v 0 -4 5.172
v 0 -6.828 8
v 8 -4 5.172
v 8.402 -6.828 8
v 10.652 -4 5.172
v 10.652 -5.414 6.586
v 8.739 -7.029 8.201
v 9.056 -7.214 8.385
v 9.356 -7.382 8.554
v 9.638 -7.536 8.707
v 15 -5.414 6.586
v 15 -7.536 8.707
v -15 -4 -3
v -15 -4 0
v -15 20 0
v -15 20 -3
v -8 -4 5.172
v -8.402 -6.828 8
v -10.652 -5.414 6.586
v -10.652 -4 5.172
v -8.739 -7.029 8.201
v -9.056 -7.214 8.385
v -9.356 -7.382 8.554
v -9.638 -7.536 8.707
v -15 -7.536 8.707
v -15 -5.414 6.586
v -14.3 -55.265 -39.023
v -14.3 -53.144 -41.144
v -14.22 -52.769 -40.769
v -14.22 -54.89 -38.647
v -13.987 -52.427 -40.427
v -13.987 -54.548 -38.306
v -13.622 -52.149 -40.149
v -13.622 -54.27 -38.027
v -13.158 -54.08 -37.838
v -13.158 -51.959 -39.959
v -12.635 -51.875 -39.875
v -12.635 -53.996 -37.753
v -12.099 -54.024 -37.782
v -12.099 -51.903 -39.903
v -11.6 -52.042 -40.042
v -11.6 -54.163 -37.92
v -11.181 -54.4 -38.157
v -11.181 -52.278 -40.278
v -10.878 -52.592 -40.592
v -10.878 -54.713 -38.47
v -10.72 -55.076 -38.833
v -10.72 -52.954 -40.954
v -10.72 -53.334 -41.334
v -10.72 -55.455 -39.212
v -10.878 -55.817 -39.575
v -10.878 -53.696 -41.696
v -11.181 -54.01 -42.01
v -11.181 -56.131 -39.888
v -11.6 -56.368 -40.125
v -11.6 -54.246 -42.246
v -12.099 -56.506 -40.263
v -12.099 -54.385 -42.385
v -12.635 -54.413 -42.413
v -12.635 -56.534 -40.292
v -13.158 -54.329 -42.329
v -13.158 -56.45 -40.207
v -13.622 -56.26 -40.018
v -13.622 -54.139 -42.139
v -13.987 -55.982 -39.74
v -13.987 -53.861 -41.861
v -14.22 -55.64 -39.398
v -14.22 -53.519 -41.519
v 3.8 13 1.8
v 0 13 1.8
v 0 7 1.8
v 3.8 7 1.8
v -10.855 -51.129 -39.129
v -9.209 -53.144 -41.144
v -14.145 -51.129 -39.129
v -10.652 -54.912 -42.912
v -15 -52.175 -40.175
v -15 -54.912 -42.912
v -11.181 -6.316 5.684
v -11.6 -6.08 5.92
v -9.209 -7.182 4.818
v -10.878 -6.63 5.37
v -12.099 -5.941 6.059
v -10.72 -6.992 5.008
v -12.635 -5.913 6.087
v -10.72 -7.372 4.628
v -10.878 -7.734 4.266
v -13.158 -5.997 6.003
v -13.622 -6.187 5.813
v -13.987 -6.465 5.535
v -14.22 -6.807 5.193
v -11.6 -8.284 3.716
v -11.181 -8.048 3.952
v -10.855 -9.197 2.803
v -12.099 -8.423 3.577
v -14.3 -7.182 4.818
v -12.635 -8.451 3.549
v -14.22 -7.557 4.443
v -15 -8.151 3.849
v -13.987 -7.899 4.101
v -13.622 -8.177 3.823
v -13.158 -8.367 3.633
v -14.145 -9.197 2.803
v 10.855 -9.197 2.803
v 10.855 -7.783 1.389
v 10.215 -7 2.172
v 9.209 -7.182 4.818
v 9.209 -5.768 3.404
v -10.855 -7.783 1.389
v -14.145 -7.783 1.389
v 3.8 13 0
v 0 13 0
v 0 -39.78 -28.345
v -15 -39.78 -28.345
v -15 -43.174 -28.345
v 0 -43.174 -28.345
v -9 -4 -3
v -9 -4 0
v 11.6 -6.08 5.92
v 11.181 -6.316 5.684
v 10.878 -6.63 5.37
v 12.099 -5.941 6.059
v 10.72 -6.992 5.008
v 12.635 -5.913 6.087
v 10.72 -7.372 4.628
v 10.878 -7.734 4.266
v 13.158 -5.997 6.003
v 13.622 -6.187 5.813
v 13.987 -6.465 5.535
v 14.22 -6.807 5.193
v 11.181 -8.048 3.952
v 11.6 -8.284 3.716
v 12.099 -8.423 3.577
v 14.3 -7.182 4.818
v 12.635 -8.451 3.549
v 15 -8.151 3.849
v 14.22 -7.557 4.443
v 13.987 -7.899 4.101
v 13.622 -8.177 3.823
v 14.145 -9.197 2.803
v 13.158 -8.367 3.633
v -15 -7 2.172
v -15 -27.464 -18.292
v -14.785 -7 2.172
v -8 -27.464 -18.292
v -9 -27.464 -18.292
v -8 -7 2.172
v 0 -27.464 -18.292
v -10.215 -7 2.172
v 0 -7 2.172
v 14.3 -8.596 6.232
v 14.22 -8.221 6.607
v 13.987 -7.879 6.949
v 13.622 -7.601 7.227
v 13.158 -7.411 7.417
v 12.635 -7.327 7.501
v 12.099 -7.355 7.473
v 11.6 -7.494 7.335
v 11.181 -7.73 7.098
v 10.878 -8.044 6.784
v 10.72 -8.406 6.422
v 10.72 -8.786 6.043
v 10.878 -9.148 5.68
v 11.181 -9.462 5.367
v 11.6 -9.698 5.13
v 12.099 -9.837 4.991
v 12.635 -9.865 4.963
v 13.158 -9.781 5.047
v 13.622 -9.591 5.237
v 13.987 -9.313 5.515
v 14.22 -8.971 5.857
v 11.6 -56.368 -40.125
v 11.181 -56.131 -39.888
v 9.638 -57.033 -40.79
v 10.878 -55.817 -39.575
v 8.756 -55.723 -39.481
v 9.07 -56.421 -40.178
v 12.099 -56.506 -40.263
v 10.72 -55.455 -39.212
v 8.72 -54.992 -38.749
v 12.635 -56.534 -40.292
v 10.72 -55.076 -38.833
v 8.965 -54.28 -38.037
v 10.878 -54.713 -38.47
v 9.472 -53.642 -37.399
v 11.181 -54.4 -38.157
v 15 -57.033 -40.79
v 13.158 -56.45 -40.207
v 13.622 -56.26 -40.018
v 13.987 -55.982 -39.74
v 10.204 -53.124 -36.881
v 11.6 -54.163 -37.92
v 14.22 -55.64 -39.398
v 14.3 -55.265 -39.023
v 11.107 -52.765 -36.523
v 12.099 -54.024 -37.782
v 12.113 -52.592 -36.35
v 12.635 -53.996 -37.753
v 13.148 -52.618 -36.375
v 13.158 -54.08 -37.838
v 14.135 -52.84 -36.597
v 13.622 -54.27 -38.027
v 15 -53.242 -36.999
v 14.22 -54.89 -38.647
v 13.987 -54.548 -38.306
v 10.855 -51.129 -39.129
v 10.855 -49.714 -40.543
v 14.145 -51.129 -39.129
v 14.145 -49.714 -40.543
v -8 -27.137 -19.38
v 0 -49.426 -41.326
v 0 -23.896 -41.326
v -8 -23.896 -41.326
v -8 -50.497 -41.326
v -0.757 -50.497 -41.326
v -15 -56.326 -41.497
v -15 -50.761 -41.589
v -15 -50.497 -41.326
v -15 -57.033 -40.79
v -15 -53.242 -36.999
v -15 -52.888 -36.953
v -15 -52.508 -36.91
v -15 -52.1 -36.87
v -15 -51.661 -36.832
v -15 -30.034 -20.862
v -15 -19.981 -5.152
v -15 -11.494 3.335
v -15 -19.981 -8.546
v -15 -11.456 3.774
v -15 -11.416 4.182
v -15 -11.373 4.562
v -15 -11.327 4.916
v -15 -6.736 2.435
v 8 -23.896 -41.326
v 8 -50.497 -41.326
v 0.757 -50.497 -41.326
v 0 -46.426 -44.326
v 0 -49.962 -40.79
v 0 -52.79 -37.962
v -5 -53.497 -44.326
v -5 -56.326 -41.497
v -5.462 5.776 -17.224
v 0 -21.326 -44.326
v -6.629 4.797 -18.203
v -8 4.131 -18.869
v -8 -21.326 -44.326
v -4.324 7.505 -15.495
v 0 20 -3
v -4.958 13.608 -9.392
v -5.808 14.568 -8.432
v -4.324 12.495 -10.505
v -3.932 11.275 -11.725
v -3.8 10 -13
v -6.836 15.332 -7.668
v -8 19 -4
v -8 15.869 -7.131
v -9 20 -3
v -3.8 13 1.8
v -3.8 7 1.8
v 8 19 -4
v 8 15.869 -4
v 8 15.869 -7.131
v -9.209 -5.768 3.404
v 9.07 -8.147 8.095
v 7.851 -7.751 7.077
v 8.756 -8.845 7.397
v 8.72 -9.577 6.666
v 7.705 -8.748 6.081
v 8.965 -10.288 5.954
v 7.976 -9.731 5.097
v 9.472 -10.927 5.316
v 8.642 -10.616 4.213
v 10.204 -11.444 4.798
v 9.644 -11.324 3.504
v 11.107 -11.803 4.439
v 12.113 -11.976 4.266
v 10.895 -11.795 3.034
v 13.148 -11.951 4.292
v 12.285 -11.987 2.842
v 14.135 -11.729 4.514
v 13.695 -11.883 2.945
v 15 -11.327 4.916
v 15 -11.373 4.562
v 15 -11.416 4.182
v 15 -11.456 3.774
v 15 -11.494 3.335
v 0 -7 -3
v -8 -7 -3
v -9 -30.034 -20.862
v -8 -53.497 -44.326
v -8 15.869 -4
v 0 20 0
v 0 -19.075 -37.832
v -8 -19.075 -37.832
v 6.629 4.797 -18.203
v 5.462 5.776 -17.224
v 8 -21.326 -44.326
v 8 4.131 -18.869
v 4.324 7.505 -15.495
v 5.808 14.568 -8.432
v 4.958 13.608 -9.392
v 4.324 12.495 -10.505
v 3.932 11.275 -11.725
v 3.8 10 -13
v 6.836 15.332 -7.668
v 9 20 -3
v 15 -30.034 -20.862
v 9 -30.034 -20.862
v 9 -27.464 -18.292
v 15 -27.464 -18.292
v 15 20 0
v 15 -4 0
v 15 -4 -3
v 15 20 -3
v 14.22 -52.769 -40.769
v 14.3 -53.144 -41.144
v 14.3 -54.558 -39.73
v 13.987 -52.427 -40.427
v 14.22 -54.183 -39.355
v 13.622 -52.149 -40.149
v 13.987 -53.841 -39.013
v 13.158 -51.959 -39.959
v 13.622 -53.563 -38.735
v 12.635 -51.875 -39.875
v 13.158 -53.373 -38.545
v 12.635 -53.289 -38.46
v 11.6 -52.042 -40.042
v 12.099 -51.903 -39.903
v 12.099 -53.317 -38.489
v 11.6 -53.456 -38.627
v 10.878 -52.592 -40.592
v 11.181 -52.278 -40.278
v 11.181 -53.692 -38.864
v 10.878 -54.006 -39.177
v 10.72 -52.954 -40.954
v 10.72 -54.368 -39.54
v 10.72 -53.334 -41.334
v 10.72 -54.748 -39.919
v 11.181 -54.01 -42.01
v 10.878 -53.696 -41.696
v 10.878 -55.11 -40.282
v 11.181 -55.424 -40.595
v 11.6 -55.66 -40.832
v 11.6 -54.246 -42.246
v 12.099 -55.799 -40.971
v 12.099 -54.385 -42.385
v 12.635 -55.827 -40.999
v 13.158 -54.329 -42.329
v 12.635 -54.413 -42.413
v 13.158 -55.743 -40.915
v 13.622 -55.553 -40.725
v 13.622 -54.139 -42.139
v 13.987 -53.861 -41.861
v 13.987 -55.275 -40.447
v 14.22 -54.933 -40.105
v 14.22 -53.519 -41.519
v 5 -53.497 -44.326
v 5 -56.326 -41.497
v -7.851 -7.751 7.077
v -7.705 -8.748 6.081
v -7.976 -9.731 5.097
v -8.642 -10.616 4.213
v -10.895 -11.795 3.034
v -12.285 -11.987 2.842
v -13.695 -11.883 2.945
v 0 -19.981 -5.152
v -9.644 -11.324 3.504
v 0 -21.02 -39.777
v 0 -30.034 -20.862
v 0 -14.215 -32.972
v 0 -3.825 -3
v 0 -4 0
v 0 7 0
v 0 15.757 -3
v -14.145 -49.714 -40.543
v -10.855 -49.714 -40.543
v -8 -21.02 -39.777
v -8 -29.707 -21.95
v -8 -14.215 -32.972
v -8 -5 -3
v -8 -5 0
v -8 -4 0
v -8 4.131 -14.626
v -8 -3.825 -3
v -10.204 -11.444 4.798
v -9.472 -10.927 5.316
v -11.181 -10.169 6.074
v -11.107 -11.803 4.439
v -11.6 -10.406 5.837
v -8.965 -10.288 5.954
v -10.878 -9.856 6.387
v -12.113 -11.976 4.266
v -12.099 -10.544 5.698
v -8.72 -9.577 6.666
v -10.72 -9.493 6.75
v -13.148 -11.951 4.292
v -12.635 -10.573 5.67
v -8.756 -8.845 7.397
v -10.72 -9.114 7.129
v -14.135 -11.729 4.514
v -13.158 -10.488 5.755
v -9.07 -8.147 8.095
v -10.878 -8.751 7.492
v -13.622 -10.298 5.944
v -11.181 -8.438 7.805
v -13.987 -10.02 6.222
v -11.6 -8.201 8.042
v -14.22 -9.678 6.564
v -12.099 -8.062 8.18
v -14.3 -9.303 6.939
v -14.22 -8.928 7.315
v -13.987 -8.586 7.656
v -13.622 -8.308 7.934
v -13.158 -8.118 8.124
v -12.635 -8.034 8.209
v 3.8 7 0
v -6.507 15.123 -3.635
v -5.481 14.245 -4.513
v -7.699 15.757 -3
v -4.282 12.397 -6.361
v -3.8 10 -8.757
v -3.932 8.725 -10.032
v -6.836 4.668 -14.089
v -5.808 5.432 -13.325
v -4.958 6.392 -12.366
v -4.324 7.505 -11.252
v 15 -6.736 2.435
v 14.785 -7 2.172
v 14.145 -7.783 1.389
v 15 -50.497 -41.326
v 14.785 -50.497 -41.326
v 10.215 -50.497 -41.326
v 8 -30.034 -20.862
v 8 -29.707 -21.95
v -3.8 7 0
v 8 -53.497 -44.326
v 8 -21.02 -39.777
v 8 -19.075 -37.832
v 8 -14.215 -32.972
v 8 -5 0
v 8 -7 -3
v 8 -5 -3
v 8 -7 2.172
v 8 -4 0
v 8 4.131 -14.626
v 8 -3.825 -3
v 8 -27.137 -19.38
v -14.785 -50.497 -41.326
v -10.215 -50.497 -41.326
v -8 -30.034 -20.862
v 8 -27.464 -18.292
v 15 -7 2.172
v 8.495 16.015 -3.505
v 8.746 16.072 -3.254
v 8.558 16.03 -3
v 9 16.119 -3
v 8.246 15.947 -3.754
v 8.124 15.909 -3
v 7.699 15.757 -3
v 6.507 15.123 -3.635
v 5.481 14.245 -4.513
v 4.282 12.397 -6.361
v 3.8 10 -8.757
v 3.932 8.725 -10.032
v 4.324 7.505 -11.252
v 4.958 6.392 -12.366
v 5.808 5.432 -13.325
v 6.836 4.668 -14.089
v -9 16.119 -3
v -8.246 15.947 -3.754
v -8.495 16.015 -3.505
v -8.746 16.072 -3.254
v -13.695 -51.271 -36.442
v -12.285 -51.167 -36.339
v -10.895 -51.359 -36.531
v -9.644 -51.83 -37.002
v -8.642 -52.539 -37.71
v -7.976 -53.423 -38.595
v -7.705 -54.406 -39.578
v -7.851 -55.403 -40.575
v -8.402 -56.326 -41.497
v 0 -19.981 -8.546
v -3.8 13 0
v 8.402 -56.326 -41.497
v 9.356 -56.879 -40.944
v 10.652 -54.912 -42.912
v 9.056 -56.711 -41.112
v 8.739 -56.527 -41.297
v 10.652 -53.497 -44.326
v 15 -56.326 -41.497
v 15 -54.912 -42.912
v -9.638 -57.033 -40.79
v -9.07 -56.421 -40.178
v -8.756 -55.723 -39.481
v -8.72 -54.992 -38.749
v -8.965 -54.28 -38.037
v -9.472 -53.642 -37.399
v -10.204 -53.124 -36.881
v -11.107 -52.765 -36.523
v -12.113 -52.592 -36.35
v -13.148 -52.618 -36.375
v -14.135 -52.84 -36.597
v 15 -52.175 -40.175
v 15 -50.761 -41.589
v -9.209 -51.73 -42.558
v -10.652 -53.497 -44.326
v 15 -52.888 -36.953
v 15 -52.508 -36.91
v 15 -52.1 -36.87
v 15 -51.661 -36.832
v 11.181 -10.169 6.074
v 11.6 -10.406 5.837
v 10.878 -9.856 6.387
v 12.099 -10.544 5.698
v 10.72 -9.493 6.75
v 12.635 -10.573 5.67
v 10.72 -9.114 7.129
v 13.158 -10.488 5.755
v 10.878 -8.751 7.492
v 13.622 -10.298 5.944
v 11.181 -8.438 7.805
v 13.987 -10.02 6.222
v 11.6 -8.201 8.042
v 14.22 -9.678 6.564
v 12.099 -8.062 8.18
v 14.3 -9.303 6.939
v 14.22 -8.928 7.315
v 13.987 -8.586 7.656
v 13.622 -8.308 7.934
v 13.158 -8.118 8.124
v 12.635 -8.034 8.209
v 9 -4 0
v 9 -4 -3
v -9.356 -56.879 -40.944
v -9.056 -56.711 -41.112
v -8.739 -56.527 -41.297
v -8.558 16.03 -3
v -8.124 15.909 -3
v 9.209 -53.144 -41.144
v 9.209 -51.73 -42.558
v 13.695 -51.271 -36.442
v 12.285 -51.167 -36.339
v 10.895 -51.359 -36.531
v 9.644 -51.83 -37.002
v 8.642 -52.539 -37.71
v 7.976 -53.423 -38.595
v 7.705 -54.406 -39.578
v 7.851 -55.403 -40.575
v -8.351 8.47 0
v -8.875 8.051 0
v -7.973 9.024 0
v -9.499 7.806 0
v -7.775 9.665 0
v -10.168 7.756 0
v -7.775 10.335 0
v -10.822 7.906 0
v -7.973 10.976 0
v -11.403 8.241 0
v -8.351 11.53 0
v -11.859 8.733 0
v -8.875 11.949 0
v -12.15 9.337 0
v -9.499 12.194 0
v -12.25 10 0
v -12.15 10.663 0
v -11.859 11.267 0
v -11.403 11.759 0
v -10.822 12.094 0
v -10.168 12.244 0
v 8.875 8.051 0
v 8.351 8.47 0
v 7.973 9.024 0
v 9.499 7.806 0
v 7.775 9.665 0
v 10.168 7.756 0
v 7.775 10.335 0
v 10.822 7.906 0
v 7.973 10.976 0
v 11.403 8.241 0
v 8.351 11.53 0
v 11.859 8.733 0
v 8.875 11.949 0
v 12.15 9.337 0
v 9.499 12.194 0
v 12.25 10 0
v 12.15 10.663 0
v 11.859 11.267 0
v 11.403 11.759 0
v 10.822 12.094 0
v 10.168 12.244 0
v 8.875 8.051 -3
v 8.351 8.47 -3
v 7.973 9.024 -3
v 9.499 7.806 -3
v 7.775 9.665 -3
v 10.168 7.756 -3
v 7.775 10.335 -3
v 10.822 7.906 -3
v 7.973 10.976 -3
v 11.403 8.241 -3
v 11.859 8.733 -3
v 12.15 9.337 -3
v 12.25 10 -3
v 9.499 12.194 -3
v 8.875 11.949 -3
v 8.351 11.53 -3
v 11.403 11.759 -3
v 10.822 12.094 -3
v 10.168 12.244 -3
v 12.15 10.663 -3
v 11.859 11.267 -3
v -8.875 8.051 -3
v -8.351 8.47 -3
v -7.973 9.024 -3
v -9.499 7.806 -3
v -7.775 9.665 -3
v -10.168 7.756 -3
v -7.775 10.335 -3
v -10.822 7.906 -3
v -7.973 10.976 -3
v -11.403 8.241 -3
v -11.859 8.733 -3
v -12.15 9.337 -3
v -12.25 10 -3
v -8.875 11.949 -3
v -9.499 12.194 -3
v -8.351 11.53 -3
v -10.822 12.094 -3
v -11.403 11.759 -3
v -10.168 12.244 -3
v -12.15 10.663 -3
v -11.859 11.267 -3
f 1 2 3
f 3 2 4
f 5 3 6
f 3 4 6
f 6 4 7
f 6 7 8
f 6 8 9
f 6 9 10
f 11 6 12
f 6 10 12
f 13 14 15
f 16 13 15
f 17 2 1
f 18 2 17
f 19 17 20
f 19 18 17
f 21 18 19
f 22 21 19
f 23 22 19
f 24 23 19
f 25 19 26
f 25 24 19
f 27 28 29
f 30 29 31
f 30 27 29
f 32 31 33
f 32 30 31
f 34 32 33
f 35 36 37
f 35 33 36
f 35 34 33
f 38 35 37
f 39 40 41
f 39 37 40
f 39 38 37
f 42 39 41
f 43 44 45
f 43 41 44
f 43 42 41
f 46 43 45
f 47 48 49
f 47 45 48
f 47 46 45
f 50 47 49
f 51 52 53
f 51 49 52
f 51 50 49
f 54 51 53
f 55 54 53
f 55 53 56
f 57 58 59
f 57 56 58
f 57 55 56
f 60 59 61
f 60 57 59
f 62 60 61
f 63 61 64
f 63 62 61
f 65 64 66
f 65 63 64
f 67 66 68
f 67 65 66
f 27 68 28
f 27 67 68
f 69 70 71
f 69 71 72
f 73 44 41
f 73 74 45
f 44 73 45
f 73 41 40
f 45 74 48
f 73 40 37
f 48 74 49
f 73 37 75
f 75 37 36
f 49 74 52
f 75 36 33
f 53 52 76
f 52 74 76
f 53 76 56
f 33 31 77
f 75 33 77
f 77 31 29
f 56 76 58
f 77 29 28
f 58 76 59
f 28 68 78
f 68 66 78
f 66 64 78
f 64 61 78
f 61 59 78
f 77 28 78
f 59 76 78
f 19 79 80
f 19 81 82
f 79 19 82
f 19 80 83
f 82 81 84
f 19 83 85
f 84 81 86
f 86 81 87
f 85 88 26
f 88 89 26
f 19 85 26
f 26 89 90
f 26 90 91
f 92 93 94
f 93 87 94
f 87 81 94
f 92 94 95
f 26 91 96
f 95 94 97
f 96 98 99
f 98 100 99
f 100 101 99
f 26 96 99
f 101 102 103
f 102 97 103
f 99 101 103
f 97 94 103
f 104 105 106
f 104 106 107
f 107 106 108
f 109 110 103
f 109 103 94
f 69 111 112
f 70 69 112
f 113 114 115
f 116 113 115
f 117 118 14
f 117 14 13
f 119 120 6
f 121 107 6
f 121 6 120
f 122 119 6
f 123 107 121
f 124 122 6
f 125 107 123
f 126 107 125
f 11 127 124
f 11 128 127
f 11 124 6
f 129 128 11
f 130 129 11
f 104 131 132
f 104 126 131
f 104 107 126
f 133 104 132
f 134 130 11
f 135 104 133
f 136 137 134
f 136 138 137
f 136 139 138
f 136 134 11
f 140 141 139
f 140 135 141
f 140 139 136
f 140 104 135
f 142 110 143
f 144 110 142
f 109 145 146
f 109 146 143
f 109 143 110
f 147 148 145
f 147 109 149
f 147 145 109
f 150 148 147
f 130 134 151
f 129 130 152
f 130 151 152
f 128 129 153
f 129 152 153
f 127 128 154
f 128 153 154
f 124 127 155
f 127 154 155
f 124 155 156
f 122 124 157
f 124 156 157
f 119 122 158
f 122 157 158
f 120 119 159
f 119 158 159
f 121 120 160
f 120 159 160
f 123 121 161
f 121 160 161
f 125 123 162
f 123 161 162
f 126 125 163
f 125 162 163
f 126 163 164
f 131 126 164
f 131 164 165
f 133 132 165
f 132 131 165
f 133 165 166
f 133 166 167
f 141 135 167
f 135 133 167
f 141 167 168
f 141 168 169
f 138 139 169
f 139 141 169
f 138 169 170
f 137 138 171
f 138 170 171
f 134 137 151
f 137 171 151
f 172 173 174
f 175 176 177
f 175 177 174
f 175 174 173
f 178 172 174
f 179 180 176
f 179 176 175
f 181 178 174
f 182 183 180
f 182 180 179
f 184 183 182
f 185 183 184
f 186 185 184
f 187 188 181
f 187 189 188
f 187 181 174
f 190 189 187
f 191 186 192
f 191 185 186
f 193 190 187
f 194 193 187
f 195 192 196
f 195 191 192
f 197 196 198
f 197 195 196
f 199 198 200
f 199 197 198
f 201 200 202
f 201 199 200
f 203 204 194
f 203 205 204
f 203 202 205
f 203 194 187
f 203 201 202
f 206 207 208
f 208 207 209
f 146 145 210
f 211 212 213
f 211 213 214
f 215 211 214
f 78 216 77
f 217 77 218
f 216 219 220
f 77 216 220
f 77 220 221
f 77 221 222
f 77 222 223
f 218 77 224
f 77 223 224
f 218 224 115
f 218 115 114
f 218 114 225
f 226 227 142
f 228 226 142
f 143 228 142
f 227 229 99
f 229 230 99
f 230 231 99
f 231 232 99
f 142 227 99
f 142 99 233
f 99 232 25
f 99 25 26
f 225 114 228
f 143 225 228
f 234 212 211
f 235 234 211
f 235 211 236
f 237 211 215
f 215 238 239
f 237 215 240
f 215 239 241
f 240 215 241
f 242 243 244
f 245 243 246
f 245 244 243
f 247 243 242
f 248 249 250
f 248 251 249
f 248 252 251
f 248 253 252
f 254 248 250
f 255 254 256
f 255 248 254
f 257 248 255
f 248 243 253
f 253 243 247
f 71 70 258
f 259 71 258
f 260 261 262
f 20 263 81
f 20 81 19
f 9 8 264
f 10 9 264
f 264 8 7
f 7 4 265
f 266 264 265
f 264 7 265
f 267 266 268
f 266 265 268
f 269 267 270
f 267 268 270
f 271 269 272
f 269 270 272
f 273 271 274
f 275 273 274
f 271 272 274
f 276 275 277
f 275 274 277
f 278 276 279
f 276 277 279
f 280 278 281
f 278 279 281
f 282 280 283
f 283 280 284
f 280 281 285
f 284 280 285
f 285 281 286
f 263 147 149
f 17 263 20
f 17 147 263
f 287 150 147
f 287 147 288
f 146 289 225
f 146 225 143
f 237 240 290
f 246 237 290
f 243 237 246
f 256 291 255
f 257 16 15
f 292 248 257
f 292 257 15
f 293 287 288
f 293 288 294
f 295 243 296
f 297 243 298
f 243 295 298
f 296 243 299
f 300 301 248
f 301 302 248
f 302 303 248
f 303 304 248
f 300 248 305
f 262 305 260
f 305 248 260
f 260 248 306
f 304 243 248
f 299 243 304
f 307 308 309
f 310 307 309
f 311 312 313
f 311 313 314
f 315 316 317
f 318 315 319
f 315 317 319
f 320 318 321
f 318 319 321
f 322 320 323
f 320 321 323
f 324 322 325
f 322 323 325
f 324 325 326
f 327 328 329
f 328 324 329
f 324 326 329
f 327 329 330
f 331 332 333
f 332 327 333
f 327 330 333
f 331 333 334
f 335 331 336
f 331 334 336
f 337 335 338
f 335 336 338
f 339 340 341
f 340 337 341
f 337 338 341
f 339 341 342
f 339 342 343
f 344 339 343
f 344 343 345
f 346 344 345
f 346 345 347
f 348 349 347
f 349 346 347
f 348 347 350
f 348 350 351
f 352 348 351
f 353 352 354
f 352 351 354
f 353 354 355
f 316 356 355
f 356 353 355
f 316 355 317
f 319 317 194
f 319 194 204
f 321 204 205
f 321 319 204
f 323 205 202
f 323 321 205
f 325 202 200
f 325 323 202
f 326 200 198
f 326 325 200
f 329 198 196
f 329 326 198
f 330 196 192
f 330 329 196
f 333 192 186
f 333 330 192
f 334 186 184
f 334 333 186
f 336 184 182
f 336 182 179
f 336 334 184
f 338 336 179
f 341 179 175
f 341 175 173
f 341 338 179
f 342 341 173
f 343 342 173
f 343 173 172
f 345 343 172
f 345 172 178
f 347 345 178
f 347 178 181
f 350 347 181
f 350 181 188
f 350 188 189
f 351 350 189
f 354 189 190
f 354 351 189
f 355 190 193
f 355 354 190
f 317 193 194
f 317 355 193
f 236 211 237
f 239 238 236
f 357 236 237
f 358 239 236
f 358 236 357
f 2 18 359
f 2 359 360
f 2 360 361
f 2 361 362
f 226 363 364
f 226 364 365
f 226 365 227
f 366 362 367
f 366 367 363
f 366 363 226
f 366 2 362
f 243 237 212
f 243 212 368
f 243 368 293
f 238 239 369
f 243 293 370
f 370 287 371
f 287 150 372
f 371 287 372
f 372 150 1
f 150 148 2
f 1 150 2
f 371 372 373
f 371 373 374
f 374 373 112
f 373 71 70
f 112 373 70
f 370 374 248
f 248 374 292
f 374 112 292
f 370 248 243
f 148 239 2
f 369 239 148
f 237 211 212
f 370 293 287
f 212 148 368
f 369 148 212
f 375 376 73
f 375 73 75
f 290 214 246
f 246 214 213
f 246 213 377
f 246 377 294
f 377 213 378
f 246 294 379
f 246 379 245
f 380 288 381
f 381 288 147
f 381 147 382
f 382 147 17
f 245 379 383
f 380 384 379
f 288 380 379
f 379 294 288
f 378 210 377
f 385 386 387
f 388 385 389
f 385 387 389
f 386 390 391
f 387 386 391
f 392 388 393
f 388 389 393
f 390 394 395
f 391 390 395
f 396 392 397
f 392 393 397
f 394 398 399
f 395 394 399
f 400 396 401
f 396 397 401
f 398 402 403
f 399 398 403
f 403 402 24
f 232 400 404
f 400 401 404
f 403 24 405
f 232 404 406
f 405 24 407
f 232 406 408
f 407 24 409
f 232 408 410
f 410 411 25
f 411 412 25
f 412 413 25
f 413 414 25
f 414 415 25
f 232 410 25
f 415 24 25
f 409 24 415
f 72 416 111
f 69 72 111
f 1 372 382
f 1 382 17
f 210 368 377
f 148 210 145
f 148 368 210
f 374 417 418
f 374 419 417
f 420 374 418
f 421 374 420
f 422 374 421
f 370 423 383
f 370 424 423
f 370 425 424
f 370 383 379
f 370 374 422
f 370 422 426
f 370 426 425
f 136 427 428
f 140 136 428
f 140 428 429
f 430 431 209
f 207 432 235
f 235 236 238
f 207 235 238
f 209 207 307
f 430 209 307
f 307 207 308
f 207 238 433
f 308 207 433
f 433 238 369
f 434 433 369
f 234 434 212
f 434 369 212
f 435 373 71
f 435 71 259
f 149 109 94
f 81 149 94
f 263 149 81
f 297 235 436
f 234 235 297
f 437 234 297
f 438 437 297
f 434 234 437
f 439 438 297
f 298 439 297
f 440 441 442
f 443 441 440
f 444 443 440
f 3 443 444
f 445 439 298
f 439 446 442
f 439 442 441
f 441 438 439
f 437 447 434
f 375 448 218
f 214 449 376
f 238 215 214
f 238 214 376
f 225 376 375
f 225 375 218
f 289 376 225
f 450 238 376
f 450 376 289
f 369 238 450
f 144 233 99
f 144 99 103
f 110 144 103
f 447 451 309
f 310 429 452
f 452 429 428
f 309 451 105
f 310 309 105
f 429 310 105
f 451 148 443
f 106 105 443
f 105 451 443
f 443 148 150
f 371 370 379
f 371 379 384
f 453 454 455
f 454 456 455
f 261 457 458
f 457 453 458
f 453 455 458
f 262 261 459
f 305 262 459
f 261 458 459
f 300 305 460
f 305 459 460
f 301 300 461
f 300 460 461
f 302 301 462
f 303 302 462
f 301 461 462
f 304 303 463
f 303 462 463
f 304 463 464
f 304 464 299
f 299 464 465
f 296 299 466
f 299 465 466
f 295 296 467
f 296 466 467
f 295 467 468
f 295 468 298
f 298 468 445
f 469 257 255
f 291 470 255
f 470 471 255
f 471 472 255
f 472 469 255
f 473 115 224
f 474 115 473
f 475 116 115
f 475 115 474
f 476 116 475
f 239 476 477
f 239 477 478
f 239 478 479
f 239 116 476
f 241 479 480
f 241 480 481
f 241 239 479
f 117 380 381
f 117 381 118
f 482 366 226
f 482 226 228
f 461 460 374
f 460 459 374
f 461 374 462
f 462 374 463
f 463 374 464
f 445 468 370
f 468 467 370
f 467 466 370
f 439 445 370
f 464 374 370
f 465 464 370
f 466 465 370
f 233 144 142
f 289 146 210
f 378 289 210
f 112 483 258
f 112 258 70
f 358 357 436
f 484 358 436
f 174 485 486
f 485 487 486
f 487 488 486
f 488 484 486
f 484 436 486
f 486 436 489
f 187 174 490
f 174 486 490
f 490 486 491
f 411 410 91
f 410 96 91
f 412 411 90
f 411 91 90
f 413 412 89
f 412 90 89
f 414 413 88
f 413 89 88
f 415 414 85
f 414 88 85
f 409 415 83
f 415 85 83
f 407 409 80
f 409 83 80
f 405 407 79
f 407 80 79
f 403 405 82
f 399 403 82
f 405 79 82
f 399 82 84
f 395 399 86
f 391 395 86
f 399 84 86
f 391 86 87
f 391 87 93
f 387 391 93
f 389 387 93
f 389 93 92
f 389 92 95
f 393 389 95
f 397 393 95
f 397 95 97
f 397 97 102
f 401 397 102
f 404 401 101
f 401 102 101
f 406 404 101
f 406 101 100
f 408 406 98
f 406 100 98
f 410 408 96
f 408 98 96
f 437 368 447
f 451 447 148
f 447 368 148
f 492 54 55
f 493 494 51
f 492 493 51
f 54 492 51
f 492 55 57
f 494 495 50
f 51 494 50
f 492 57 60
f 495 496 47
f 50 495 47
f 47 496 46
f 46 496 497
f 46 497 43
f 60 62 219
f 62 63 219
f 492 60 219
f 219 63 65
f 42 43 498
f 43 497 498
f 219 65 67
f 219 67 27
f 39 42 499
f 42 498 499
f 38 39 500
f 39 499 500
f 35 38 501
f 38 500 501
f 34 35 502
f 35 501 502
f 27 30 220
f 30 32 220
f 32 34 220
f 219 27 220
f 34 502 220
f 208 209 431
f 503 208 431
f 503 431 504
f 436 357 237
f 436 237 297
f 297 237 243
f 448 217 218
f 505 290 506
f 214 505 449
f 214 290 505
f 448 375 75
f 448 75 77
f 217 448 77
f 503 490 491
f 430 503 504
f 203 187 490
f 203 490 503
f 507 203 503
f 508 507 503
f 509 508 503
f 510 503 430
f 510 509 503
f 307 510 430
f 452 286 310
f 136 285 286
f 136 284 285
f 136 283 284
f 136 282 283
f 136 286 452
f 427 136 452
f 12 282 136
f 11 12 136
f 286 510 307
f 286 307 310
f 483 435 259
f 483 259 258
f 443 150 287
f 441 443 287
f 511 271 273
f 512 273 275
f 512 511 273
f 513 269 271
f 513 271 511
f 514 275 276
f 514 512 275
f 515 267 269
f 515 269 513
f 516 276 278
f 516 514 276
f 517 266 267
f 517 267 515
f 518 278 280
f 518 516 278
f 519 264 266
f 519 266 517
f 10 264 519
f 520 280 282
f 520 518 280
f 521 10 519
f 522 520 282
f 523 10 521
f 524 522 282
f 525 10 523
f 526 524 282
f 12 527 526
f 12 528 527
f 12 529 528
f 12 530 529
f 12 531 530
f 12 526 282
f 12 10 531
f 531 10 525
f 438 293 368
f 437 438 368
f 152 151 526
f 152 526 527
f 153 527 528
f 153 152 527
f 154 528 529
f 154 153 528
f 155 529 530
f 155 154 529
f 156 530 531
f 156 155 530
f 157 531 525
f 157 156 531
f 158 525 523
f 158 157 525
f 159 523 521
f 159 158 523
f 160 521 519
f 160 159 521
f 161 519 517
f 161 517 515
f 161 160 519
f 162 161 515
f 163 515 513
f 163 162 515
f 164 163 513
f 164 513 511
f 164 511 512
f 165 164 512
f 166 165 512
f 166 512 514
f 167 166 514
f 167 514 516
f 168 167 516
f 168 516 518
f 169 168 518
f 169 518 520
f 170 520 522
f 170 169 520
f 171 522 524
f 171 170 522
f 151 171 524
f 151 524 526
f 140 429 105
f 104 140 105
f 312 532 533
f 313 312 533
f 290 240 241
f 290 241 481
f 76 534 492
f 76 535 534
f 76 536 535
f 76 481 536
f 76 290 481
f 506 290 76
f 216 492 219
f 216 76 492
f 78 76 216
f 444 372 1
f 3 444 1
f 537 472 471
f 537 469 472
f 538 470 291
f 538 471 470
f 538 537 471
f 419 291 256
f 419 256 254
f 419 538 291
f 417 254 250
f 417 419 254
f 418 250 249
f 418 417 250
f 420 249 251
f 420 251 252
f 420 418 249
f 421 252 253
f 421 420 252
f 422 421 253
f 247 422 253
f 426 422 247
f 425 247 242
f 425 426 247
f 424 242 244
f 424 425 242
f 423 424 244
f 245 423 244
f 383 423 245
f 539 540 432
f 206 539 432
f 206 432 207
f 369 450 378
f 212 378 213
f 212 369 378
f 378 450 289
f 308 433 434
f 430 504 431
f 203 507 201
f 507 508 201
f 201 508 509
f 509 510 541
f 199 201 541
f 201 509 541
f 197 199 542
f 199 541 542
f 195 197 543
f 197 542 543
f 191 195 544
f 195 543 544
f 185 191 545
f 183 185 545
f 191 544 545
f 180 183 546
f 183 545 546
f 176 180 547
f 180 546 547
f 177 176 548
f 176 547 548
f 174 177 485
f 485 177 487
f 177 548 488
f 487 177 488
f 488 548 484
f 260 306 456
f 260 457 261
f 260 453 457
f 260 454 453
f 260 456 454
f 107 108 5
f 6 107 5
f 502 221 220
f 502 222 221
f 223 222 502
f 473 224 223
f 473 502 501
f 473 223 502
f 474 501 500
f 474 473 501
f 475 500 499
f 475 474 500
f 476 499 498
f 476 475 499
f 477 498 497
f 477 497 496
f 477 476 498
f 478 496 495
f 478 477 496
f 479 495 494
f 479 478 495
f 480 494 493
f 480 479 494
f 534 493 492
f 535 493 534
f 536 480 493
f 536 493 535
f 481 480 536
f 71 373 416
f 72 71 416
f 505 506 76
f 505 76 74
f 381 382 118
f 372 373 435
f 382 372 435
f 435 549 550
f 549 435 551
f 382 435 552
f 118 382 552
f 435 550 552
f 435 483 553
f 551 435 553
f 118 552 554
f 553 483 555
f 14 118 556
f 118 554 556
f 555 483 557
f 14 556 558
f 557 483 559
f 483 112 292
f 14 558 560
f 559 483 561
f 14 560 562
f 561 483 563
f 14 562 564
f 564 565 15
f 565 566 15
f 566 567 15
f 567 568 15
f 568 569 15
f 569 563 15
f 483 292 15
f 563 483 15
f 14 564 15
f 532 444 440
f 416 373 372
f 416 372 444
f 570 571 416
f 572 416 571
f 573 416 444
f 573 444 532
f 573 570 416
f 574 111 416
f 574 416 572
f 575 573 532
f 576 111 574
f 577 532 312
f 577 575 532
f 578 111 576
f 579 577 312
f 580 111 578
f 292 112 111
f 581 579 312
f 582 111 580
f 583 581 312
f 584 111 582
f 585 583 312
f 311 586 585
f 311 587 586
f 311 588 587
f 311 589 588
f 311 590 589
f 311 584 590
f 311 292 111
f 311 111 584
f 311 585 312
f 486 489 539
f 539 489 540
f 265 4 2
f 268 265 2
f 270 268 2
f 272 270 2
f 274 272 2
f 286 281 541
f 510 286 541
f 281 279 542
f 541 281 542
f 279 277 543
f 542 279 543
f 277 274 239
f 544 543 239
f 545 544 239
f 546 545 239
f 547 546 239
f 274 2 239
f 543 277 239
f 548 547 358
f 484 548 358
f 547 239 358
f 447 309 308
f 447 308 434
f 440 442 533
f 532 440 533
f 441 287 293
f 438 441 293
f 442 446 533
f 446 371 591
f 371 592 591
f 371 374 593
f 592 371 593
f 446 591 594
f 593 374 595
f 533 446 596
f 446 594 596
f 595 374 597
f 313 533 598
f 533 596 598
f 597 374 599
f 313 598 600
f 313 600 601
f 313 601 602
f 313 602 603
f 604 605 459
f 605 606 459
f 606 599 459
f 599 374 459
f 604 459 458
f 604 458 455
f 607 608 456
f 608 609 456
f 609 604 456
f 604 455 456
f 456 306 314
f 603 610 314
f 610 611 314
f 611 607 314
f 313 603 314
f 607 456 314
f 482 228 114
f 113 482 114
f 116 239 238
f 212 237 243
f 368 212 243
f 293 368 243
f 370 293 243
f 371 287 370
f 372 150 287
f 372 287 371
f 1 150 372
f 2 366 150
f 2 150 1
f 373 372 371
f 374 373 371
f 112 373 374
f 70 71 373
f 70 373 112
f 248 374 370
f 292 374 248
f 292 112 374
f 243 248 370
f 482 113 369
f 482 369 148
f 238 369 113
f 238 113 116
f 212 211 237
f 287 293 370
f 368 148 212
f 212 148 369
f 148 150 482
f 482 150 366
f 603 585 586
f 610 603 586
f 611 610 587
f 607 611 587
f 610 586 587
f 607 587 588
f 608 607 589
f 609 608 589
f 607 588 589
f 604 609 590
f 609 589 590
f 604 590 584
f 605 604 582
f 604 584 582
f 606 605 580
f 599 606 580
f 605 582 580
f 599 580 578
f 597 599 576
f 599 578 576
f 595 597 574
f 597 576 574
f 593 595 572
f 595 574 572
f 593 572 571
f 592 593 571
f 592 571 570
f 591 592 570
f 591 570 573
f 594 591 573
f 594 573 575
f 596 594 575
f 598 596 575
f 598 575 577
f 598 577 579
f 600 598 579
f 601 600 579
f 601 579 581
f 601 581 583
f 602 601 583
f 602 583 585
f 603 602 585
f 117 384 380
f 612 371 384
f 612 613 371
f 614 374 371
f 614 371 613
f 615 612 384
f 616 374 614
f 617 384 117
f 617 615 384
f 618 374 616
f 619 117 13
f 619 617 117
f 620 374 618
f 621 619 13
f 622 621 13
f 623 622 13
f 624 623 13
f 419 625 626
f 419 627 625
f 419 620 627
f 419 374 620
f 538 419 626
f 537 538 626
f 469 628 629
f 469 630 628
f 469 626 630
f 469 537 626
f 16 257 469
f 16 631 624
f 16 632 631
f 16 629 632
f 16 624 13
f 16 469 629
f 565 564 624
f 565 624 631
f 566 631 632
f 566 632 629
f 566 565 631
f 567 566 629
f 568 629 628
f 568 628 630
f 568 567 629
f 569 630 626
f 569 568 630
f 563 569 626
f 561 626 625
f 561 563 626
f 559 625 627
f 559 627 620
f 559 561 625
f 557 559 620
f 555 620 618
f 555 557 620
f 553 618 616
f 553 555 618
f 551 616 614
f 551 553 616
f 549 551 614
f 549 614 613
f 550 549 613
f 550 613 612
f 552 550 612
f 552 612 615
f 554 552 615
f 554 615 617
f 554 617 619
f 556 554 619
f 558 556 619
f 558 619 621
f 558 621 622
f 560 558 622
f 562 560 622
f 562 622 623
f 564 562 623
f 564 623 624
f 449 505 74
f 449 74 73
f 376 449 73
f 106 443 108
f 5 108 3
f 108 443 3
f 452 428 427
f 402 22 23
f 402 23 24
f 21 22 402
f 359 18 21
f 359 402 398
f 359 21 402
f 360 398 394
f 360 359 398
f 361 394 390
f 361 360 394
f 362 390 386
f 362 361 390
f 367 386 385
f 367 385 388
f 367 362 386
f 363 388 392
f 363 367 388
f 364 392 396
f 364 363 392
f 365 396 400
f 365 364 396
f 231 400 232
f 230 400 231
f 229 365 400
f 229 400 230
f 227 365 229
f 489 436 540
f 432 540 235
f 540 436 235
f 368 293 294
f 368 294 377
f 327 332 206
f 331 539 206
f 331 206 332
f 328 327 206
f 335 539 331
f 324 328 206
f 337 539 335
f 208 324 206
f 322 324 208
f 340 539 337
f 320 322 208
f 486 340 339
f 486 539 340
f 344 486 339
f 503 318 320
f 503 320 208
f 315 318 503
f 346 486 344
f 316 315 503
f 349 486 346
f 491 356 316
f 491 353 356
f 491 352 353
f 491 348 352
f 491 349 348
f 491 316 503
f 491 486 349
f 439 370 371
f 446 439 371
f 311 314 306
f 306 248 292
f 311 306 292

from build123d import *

# Parameters (mm, degrees)
F1_DEPTH      = 15
F2_DEPTH      = 8
F4_DEPTH      = 1.8
F3_R          = 2.25
F5_DEPTH      = 44.3269018078
F6_START      = -3
F6_DEPTH      = 41.3269018078
F7_R          = 1.8
F8_DEPTH      = 4
F9_DEPTH      = 1
F10_T1_DEPTH  = 3
F10_T6_ANGLE  = 249.9440889996
F10_T12_ANGLE = 249.9440889996
F10_T18_DEPTH = 8.7779135172
F10_T24_DEPTH = 9.2748056755
F10_S25_R     = 6.2
F10_T26_DEPTH = 6
F11_R         = 1.8
F12_DEPTH     = 2
F13_T1_DEPTH  = 29.7168298797
F16_DEPTH     = 15


# Not quite as in the source:
# - a fillet or chamfer that OpenCascade refuses, or shapes differently, is made with other operations: its cross-section is extruded or revolved along the edge and cut away or added


with BuildPart() as f1:
    # F0 (on Right) → F1 (new body)
    with BuildSketch(Plane.YZ):
        Polygon((-7, 2.1715728753), (-4, 5.1715728753), (-6.8284271247, 8), (-56.3259018078, -41.4974746831), (-53.4974746831, -44.3259018078), (-50.4974746831, -41.3259018078), (-30.033743948, -20.8621710728), (-27.463730735, -18.2921578598), align=None)
    extrude(amount=F1_DEPTH)



with BuildPart() as f1b:
    # F0 (on Right) → F1, piece 2 (new body)
    with BuildSketch(Plane.YZ):
        Polygon((20, 0), (0, 0), (-4, 0), (-4, -3), (-3.8248562286, -3), (15.7573593129, -3), (20, -3), align=None)
    extrude(amount=F1_DEPTH)


with BuildPart() as f1_1:
    add(f1.part)

    add(f1b.part)  # F2 merges F1b
    # F0 (on Right) → F2 (join)
    with BuildSketch(Plane.YZ):
        Polygon((-21.3259018078, -44.3259018078), (20, -3), (15.7573593129, -3), (-14.2149635258, -32.9723228387), (-3.8248562286, -3), (-4, -3), (-7, -3), (-19.0748035156, -37.8321628285), align=None)
        Polygon((-53.4974746831, -44.3259018078), (-21.3259018078, -44.3259018078), (-19.0748035156, -37.8321628285), (-21.0197849861, -39.777144299), (-27.463730735, -18.2921578598), (-30.033743948, -20.8621710728), (-23.8961012248, -41.3259018078), (-50.4974746831, -41.3259018078), align=None)
        Polygon((-4, -3), (-4, 0), (-4, 5.1715728753), (-7, 2.1715728753), (-7, -3), align=None)
    extrude(amount=F2_DEPTH)

    # F3 (on face) → F4 (join)
    with BuildSketch(Plane.XY):
        Polygon((3.8, 7), (3.8, 10), (3.8, 13), (0, 13), (0, 7), align=None)
    extrude(amount=F4_DEPTH)

    # F3 (on face) → F5 (cut, through all)
    with BuildSketch(Plane.XY):
        with Locations((10, 10)):
            Circle(F3_R)
    extrude(amount=-F5_DEPTH, mode=Mode.SUBTRACT)

    # F3 (on face) → F6 (cut)
    with BuildSketch(Plane.XY.offset(F6_START)):
        with BuildLine():
            Line((15, 6.333939444), (15, 13.666060556))
            ThreePointArc((15, 13.666060556), (8.0712698478, 15.8923679451), (3.8, 10))
            ThreePointArc((3.8, 10), (8.0712698478, 4.1076320549), (15, 6.333939444))
        make_face()
        with Locations((10, 10)):
            Circle(F3_R, mode=Mode.SUBTRACT)
    extrude(amount=-F6_DEPTH, mode=Mode.SUBTRACT)

    # F7 (on face) → F8 (cut, through all)
    with BuildSketch(Plane(origin=(0, -7.4142135624, 7.4142135624), x_dir=(1, 0, 0), z_dir=(0, -0.7071067812, 0.7071067812))):
        with Locations((12.5, -1.6715728753)):
            Circle(F7_R)
        with Locations((12.5, -66.6715728753)):
            Circle(F7_R)
    extrude(amount=-F8_DEPTH, mode=Mode.SUBTRACT)

    # F7 (on face) → F9 (join)
    with BuildSketch(Plane(origin=(0, -7.4142135624, 7.4142135624), x_dir=(1, 0, 0), z_dir=(0, -0.7071067812, 0.7071067812))):
        with BuildLine():
            Line((15, 0.8284271247), (9.6381823957, 0.8284271247))
            ThreePointArc((9.6381823957, 0.8284271247), (9.8129942315, -4.3585786438), (15, -4.5333904795))
            Line((15, -4.5333904795), (15, 0.8284271247))
        make_face()
        with Locations((12.5, -1.6715728753)):
            Circle(F7_R, mode=Mode.SUBTRACT)
        with BuildLine():
            Line((15, -69.1715728753), (15, -63.809755271))
            ThreePointArc((15, -63.809755271), (9.8129942315, -63.9845671067), (9.6381823957, -69.1715728753))
            Line((9.6381823957, -69.1715728753), (15, -69.1715728753))
        make_face()
        with Locations((12.5, -66.6715728753)):
            Circle(F7_R, mode=Mode.SUBTRACT)
    extrude(amount=F9_DEPTH)

    # F10: chamfer of 1 on 5 edges, made by hand

    # F10_s2 → F10_t1 (join)
    with BuildSketch(Plane.XY.offset(-3)):
        Polygon((8, -5), (9, -4), (8, -4), align=None)
    extrude(amount=F10_T1_DEPTH)


with BuildPart() as f10_tool4:
    # F10_s5 → F10_t6 (revolve)
    with BuildSketch(Plane(origin=(11.8343680608, 1.4797429858, 1.4797429858), x_dir=(-0.1240716356, 0.9922732634, 0), z_dir=(0.9847229102, 0.1231275563, 0.1231275563))):
        Polygon((-8.0747037896, 8.1677022303), (-6.6605321208, 8.1568168681), (-7.3730606363, 7.4551737148), align=None)
    revolve(axis=Axis((12.5, -8.5961940777, 6.232233047), (0, -0.7071067812, 0.7071067812)), revolution_arc=F10_T6_ANGLE)

    split(bisect_by=Plane(origin=(0, 0.5857864376, 0.5857864376), x_dir=(1, 0, 0), z_dir=(0, -0.7071067812, -0.7071067812)), keep=Keep.TOP)

    split(bisect_by=Plane.YZ.offset(15), keep=Keep.BOTTOM)


with BuildPart() as f1_2:
    add(f1_1.part)

    # F10_t3: union F10_tool4
    add(f10_tool4.part)


with BuildPart() as f10_tool10:
    # F10_s11 → F10_t12 (revolve)
    with BuildSketch(Plane(origin=(11.8110831902, -47.2300619137, -47.2300619137), x_dir=(0.9701252548, 0.242604596, 0), z_dir=(0.17412866, -0.6963042474, -0.6963042474))):
        Polygon((2.462632391, 12.0869174199), (3.6193556211, 11.2732888997), (2.6341797459, 11.1017415448), align=None)
    revolve(axis=Axis((12.5, -54.5581348548, -39.7297077301), (0, -0.7071067812, 0.7071067812)), revolution_arc=F10_T12_ANGLE)

    split(bisect_by=Plane(origin=(0, -48.9116882454, -48.9116882454), x_dir=(1, 0, 0), z_dir=(0, 0.7071067812, 0.7071067812)), keep=Keep.TOP)

    split(bisect_by=Plane.YZ.offset(15), keep=Keep.BOTTOM)


with BuildPart() as f1_3:
    add(f1_2.part)

    # F10_t9: union F10_tool10
    add(f10_tool10.part)


with BuildPart() as f10_tool16:
    # F10_s17 → F10_t18 (new body)
    with BuildSketch(Plane(origin=(0, -21.0594898175, -21.0594898175), x_dir=(1, 0, 0), z_dir=(0, -0.7071067812, -0.7071067812))):
        Polygon((9, 6.4852813742), (8, 5.4852813742), (8, 6.4852813742), align=None)
    extrude(amount=F10_T18_DEPTH)

    split(bisect_by=Plane(origin=(0, -30.2306117792, -9.0670023373), x_dir=(1, 0, 0), z_dir=(0, -0.9578453043, -0.2872844809)), keep=Keep.TOP)

    split(bisect_by=Plane(origin=(0, -33.295716753, -9.9863126763), x_dir=(1, 0, 0), z_dir=(0, 0.9578453043, 0.2872844809)), keep=Keep.TOP)


with BuildPart() as f1_4:
    add(f1_3.part)

    # F10_t15: union F10_tool16
    add(f10_tool16.part)


with BuildPart() as f10_tool22:
    # F10_s23 → F10_t24 (new body)
    with BuildSketch(Plane.XZ.offset(-22.571682988)):
        Polygon((9, -3), (8, -4), (8, -3), align=None)
    extrude(amount=F10_T24_DEPTH)

    # F10_s25 → F10_t26 (cut, symmetric)
    with BuildSketch(Plane.XY.offset(-3.5)):
        with Locations((10, 10)):
            Circle(F10_S25_R)
    extrude(amount=F10_T26_DEPTH, both=True, mode=Mode.SUBTRACT)

    split(bisect_by=Plane(origin=(0, 11.5, -11.5), x_dir=(1, 0, 0), z_dir=(0, -0.7071067812, 0.7071067812)), keep=Keep.TOP)


with BuildPart() as f1_5:
    add(f1_4.part)

    # F10_t21: union F10_tool22
    add(f10_tool22.part)

    # F11 (on face) → F12 (cut)
    with BuildSketch(Plane(origin=(0, -4.5857864376, 4.5857864376), x_dir=(1, 0, 0), z_dir=(0, 0.7071067812, -0.7071067812))):
        Polygon((10.6524791385, -0.8284271247), (14.3475208615, -0.8284271247), (15, 0.301699894), (15, 3.0414458562), (14.1454482672, 4.5215728751), (10.8545517328, 4.5215728751), (9.2091034656, 1.6715728751), align=None)
        with Locations((12.5, 1.6715728753)):
            Circle(F11_R, mode=Mode.SUBTRACT)
        Polygon((14.1454482672, 63.8215728752), (15, 65.3016998941), (15, 68.0414458563), (14.3475208614, 69.1715728753), (10.6524791386, 69.1715728753), (9.2091034656, 66.6715728752), (10.8545517328, 63.8215728752), align=None)
        with Locations((12.5, 66.6715728753)):
            Circle(F11_R, mode=Mode.SUBTRACT)
        Polygon((14.3475208614, 69.1715728753), (15, 68.0414458563), (15, 69.1715728753), align=None)
        Polygon((15, 0.301699894), (14.3475208615, -0.8284271247), (15, -0.8284271247), align=None)
    extrude(amount=-F12_DEPTH, mode=Mode.SUBTRACT)

    # F13: chamfer of 5 on 1 edges, made by hand

    # F13_s2 → F13_t1 (cut)
    with BuildSketch(Plane(origin=(0, -16.5064859616, 16.5064859616), x_dir=(1, 0, 0), z_dir=(0, 0.7071067812, -0.7071067812))):
        Polygon((0, 64.1715728753), (5, 69.1715728753), (0, 69.1715728753), align=None)
    extrude(amount=F13_T1_DEPTH, mode=Mode.SUBTRACT)


with BuildPart() as f14_1:
    # F14: instance of F1
    add(f1_5.part.mirror(Plane.YZ))

    # F15 (on face) → F16 (cut, through all)
    with BuildSketch(Plane(origin=(-15, 0, 0), x_dir=(0, -1, 0), z_dir=(-1, 0, 0))):
        Polygon((43.1737156777, -28.345288553), (19.9806132548, -5.1521861301), (19.9806132548, -8.5462986798), (39.779603128, -28.345288553), align=None)
    extrude(amount=-F16_DEPTH, mode=Mode.SUBTRACT)


solid = Compound([f1_5.part, f14_1.part])
